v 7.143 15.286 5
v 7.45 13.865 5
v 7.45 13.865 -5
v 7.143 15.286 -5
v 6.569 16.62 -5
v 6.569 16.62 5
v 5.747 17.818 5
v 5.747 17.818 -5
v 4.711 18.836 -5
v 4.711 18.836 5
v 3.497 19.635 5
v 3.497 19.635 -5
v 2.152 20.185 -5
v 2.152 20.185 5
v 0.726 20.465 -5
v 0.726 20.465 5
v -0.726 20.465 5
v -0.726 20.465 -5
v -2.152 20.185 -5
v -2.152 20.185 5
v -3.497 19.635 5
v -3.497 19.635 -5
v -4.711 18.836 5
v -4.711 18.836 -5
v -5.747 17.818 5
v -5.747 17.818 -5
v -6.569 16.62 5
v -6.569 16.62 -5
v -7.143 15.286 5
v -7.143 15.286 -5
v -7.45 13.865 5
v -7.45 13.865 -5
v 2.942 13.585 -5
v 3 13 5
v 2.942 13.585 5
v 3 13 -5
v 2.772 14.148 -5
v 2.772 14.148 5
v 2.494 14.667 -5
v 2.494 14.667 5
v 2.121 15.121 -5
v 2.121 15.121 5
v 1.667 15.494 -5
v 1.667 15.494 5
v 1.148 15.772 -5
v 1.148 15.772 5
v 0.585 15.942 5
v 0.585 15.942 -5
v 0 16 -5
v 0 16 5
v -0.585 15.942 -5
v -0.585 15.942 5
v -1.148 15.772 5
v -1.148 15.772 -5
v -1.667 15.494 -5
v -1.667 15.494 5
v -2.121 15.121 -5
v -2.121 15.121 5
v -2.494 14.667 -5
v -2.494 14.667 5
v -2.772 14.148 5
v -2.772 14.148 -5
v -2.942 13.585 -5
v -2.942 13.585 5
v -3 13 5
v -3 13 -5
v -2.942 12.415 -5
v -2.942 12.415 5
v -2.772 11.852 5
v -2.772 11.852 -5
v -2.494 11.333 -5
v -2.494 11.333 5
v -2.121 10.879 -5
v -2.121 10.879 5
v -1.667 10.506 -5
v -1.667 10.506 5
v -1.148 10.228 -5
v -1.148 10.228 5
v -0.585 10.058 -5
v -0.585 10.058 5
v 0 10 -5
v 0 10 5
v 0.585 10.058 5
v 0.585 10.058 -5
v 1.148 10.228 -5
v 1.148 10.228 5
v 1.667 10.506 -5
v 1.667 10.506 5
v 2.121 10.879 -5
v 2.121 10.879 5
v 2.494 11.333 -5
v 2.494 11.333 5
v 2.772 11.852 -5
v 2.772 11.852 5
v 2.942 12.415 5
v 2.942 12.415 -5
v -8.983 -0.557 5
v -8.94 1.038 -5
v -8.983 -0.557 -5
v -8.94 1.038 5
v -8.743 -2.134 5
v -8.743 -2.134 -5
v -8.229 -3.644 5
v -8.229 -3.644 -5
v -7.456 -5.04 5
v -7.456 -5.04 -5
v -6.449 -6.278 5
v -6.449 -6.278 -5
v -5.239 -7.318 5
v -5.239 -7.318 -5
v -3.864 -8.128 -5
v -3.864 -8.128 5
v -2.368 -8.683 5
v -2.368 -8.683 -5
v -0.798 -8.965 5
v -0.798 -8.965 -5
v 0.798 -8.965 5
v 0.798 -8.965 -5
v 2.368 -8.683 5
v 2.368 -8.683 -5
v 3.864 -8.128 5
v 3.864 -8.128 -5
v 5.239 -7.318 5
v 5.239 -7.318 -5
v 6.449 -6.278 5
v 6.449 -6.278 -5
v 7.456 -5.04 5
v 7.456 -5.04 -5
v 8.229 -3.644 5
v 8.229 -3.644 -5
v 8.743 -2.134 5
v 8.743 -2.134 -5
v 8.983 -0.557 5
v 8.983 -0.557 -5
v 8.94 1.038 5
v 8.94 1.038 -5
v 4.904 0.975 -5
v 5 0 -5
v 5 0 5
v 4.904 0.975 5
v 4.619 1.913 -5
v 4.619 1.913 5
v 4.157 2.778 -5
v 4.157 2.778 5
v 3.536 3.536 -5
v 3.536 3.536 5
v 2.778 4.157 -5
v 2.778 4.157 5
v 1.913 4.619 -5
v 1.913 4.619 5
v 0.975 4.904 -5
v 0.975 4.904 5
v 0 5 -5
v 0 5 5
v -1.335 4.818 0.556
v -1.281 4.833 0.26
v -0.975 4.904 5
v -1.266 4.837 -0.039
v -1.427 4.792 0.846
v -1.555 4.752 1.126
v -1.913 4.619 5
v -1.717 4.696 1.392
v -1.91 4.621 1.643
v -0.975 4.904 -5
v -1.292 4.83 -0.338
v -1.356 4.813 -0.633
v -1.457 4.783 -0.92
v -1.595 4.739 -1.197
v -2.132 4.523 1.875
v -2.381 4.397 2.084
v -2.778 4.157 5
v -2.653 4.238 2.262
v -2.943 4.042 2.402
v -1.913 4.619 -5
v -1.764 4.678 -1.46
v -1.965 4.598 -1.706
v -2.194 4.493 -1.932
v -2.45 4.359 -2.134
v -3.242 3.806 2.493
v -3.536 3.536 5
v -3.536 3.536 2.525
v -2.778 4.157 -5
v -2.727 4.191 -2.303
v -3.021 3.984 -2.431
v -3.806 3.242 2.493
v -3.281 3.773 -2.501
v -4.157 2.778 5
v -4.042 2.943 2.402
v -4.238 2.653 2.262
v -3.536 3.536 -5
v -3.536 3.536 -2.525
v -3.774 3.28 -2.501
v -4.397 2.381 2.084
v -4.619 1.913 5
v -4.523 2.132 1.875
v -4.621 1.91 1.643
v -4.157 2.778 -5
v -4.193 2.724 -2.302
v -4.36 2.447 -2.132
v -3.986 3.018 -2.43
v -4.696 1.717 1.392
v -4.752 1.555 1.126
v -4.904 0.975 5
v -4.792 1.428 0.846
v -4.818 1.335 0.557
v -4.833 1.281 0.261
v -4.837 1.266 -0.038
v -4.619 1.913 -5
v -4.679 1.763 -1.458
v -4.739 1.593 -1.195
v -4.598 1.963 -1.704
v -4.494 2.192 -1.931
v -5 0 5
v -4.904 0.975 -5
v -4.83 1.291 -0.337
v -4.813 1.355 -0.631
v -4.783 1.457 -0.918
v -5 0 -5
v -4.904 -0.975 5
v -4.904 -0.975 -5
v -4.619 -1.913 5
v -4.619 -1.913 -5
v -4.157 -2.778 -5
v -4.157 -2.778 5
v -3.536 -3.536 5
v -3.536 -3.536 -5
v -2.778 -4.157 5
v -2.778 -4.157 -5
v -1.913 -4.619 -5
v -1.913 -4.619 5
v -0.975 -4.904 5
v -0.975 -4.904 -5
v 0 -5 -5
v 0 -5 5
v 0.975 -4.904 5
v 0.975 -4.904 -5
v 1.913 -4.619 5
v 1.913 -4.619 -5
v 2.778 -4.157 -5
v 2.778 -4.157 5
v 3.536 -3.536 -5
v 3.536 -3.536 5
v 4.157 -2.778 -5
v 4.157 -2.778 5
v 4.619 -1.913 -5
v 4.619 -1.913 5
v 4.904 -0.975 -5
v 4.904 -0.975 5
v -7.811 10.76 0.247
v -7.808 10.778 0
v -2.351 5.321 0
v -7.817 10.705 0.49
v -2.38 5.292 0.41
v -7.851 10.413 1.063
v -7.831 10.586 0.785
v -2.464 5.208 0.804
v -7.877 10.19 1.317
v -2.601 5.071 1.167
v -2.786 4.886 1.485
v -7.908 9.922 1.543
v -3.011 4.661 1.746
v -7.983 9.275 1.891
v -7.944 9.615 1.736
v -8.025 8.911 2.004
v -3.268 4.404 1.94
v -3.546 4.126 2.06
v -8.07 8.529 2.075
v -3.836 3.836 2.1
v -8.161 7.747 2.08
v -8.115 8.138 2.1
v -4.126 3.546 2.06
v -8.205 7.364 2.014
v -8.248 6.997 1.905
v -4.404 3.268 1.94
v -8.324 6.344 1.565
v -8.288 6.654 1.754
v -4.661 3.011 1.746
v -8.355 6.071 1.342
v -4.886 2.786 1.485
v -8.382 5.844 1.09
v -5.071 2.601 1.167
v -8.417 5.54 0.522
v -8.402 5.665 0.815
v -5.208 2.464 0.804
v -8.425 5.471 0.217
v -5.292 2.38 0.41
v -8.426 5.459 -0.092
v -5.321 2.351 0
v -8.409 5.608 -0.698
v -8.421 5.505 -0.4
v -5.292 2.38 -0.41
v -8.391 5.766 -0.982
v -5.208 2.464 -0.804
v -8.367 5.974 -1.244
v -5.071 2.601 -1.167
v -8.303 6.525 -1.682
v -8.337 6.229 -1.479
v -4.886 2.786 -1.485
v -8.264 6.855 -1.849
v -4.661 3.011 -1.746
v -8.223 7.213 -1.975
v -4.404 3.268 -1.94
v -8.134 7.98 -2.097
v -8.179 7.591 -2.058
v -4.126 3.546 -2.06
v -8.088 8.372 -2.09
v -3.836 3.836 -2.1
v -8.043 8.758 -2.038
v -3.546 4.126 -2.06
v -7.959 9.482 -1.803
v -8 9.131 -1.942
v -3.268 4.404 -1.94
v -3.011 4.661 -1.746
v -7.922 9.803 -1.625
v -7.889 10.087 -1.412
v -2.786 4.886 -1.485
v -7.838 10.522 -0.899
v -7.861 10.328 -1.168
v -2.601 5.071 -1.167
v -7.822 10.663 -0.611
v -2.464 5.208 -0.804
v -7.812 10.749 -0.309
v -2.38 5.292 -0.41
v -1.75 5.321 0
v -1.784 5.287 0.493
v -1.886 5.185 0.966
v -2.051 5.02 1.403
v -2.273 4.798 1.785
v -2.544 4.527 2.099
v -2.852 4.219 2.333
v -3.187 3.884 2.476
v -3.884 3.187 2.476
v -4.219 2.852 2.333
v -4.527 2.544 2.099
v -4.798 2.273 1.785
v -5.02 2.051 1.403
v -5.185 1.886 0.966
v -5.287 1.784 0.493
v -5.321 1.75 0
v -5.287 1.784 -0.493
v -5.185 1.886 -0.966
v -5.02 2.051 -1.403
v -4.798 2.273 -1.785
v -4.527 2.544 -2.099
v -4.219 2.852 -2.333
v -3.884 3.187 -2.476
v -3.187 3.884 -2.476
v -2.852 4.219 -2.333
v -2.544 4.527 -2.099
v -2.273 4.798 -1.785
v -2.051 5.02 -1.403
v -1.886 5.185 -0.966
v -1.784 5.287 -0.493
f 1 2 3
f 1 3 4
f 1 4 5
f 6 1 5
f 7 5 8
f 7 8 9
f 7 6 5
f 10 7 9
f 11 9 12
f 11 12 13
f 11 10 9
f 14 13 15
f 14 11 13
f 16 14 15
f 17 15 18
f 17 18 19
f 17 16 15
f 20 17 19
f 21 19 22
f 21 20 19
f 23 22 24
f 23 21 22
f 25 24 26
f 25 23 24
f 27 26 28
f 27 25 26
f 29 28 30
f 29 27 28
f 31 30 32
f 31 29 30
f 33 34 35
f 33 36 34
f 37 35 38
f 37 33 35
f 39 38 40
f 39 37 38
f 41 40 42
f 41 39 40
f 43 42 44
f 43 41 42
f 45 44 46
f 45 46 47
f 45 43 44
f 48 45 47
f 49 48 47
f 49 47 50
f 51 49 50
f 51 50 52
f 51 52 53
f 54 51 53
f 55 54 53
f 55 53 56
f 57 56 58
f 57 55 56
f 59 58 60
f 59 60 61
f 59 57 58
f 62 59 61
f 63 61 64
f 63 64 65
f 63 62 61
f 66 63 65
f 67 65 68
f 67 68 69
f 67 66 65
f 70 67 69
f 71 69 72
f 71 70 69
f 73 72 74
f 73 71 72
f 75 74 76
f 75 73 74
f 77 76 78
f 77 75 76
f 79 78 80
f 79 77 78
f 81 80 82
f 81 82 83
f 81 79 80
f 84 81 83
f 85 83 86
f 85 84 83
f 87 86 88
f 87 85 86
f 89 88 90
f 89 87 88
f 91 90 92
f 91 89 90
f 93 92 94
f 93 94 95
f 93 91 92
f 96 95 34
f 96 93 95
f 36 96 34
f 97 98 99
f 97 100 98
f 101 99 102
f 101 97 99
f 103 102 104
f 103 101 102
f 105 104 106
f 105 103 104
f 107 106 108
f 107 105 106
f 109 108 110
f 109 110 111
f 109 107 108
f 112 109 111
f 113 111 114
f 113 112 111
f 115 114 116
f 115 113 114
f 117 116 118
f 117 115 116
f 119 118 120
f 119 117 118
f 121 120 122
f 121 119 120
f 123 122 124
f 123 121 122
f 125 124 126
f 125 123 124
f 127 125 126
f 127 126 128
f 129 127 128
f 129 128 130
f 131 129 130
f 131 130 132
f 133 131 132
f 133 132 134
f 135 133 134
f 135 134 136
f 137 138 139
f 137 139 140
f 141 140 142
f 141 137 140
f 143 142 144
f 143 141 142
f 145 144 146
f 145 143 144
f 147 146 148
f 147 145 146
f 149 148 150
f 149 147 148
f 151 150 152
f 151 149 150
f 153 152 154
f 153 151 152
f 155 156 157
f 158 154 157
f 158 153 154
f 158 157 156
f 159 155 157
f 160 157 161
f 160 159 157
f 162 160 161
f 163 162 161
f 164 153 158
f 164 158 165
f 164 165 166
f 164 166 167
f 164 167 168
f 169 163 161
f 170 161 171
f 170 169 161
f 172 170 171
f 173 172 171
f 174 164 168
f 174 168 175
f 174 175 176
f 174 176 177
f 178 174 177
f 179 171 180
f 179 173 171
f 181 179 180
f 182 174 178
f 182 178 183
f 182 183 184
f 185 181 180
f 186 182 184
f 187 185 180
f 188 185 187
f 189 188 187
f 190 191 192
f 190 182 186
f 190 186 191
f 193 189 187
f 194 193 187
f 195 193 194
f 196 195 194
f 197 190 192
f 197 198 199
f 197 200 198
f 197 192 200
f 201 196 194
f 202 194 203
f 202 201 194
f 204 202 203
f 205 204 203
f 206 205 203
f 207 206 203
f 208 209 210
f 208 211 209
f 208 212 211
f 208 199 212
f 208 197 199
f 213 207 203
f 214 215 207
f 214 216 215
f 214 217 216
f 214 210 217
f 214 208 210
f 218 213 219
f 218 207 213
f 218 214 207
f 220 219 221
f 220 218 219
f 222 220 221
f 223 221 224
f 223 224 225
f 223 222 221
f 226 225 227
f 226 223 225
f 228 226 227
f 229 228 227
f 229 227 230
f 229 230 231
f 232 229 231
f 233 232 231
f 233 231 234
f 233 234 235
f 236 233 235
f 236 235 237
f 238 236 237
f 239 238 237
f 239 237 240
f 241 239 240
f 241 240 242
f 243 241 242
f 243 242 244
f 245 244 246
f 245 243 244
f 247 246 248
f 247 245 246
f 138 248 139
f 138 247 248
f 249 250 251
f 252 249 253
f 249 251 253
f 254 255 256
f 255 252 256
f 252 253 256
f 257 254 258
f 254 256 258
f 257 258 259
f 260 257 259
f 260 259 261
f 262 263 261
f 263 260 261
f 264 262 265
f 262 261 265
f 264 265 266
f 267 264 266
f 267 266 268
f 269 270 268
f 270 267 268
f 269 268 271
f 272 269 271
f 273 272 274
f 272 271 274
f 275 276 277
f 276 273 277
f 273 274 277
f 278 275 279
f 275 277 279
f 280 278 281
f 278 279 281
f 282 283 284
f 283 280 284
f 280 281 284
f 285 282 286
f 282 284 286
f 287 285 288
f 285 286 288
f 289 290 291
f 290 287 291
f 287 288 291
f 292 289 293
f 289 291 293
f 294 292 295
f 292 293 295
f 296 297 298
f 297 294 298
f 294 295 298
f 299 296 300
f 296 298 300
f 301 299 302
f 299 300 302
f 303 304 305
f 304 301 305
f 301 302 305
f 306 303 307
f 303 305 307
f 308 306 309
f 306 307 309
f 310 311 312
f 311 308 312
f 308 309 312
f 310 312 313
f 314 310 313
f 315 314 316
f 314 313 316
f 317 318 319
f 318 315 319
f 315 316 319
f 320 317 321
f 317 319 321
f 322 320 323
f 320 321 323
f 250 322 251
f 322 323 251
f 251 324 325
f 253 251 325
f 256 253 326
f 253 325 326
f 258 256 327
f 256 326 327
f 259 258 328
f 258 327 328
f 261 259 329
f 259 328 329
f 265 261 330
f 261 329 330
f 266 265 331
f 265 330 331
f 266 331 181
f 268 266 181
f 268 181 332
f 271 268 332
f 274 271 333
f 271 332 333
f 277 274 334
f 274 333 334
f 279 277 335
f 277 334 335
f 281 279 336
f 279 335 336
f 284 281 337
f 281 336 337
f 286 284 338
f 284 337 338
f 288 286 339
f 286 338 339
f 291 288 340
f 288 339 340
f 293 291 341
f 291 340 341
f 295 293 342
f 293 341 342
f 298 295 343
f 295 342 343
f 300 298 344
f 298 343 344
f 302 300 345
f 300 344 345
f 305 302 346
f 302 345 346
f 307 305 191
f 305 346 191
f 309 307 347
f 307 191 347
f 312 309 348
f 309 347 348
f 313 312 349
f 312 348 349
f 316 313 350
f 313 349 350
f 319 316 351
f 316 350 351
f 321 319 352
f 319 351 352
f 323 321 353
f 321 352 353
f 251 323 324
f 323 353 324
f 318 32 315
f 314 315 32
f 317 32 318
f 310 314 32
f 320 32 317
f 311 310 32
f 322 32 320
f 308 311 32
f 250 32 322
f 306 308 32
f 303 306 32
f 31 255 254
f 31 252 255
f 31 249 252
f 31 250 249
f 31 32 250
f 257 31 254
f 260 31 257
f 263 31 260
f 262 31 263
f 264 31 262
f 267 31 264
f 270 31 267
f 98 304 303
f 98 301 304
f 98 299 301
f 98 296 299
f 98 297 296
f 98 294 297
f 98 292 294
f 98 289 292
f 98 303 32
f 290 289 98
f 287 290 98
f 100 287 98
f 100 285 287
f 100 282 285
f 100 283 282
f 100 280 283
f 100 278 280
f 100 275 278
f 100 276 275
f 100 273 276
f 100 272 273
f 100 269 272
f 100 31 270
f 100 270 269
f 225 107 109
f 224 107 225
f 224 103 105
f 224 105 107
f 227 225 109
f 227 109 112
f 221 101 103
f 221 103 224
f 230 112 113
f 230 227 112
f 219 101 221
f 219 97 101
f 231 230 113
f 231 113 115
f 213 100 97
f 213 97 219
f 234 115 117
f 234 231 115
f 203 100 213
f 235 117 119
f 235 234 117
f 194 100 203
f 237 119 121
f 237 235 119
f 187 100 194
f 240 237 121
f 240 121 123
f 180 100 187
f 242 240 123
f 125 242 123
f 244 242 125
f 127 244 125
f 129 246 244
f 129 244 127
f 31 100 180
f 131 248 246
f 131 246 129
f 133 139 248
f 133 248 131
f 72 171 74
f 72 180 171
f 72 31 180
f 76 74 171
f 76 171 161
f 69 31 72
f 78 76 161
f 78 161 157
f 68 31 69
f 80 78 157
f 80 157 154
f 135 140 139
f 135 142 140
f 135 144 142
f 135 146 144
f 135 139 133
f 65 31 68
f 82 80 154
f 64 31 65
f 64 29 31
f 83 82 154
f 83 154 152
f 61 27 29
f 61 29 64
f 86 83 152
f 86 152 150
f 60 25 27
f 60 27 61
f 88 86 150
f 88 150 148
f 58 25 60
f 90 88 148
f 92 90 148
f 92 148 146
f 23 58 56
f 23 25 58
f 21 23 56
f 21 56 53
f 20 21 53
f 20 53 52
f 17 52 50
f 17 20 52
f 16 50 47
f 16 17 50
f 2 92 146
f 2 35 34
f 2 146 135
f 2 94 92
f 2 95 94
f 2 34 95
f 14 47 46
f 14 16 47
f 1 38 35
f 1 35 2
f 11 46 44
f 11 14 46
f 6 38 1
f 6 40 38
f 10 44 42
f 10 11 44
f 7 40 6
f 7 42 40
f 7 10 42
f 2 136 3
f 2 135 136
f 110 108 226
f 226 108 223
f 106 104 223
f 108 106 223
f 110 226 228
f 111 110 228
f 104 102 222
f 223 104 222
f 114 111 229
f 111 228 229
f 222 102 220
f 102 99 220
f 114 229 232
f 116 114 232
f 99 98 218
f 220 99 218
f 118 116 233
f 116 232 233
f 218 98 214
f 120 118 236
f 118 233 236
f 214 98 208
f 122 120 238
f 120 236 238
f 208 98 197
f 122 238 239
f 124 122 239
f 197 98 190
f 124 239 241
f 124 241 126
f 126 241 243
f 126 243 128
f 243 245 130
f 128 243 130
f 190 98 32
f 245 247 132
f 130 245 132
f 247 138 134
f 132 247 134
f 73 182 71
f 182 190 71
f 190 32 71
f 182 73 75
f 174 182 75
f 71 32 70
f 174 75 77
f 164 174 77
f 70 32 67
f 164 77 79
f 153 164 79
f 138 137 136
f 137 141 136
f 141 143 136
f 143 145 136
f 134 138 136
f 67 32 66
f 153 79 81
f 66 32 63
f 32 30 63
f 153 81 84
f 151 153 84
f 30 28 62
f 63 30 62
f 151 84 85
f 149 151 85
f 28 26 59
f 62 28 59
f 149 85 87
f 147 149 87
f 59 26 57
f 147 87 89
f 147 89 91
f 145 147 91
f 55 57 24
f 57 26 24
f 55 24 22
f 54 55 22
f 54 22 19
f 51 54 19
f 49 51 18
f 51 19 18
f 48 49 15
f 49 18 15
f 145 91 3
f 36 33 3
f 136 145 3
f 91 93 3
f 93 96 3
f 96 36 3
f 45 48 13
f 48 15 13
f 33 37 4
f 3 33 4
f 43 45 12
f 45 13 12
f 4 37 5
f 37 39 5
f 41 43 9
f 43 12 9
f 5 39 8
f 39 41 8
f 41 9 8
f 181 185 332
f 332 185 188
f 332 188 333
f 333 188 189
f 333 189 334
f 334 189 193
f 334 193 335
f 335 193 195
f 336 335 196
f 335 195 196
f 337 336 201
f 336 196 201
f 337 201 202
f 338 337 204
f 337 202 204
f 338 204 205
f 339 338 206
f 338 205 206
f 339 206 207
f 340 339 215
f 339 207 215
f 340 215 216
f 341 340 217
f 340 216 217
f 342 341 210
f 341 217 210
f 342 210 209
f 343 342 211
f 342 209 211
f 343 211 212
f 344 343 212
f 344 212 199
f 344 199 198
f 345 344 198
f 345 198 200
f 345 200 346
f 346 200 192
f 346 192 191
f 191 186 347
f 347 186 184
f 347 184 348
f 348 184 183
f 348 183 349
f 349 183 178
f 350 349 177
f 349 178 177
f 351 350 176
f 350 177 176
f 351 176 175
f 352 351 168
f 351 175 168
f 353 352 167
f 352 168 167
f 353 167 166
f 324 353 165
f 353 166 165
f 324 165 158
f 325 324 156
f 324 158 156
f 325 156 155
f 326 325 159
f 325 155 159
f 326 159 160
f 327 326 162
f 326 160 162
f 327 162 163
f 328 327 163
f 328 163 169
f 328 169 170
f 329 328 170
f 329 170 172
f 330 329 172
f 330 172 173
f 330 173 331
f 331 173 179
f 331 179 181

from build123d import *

# Parameters (mm, degrees)
SKETCH_1_R      = 3
SKETCH_1_R_2    = 5
EXTRUDE_1_DEPTH = 5


# Read off the part's stored shape, not the designer's step: M5 螺纹孔1
with BuildPart() as part:
    # 草图1 → 凸台-拉伸1 (new, symmetric)
    with BuildSketch(Plane.XY):
        with BuildLine():
            Line((8.93988801, 1.038461538), (7.449906675, 13.865384615))
            ThreePointArc((7.449906675, 13.865384615), (0, 20.5), (-7.449906675, 13.865384615))
            Line((-7.449906675, 13.865384615), (-8.93988801, 1.038461538))
            ThreePointArc((-8.93988801, 1.038461538), (0, -9), (8.93988801, 1.038461538))
        make_face()
        with Locations((0, 13)):
            Circle(SKETCH_1_R, mode=Mode.SUBTRACT)
        Circle(SKETCH_1_R_2, mode=Mode.SUBTRACT)
    extrude(amount=EXTRUDE_1_DEPTH, both=True)

    # M5 螺纹孔1 outline → M5 螺纹孔1 (revolve, cut)
    with BuildSketch(Plane(origin=(0, 0, 0), x_dir=(0.707106781186549, 0.707106781186546, 0), z_dir=(0, 0, -1))):
        Polygon((2.1, -4.315295433), (2.1, -5.425), (2.525, -5), (2.525, -4.315295433), align=None)
        Polygon((2.1, -13.143744736), (2.1, -5.425), (2.1, -4.315295433), (0, -4.315295433), (0, -13.143744736), align=None)
    revolve(axis=Axis((0, 0, 0), (0.707106781186546, -0.707106781186549, 0)), mode=Mode.SUBTRACT)


solid = part.part
